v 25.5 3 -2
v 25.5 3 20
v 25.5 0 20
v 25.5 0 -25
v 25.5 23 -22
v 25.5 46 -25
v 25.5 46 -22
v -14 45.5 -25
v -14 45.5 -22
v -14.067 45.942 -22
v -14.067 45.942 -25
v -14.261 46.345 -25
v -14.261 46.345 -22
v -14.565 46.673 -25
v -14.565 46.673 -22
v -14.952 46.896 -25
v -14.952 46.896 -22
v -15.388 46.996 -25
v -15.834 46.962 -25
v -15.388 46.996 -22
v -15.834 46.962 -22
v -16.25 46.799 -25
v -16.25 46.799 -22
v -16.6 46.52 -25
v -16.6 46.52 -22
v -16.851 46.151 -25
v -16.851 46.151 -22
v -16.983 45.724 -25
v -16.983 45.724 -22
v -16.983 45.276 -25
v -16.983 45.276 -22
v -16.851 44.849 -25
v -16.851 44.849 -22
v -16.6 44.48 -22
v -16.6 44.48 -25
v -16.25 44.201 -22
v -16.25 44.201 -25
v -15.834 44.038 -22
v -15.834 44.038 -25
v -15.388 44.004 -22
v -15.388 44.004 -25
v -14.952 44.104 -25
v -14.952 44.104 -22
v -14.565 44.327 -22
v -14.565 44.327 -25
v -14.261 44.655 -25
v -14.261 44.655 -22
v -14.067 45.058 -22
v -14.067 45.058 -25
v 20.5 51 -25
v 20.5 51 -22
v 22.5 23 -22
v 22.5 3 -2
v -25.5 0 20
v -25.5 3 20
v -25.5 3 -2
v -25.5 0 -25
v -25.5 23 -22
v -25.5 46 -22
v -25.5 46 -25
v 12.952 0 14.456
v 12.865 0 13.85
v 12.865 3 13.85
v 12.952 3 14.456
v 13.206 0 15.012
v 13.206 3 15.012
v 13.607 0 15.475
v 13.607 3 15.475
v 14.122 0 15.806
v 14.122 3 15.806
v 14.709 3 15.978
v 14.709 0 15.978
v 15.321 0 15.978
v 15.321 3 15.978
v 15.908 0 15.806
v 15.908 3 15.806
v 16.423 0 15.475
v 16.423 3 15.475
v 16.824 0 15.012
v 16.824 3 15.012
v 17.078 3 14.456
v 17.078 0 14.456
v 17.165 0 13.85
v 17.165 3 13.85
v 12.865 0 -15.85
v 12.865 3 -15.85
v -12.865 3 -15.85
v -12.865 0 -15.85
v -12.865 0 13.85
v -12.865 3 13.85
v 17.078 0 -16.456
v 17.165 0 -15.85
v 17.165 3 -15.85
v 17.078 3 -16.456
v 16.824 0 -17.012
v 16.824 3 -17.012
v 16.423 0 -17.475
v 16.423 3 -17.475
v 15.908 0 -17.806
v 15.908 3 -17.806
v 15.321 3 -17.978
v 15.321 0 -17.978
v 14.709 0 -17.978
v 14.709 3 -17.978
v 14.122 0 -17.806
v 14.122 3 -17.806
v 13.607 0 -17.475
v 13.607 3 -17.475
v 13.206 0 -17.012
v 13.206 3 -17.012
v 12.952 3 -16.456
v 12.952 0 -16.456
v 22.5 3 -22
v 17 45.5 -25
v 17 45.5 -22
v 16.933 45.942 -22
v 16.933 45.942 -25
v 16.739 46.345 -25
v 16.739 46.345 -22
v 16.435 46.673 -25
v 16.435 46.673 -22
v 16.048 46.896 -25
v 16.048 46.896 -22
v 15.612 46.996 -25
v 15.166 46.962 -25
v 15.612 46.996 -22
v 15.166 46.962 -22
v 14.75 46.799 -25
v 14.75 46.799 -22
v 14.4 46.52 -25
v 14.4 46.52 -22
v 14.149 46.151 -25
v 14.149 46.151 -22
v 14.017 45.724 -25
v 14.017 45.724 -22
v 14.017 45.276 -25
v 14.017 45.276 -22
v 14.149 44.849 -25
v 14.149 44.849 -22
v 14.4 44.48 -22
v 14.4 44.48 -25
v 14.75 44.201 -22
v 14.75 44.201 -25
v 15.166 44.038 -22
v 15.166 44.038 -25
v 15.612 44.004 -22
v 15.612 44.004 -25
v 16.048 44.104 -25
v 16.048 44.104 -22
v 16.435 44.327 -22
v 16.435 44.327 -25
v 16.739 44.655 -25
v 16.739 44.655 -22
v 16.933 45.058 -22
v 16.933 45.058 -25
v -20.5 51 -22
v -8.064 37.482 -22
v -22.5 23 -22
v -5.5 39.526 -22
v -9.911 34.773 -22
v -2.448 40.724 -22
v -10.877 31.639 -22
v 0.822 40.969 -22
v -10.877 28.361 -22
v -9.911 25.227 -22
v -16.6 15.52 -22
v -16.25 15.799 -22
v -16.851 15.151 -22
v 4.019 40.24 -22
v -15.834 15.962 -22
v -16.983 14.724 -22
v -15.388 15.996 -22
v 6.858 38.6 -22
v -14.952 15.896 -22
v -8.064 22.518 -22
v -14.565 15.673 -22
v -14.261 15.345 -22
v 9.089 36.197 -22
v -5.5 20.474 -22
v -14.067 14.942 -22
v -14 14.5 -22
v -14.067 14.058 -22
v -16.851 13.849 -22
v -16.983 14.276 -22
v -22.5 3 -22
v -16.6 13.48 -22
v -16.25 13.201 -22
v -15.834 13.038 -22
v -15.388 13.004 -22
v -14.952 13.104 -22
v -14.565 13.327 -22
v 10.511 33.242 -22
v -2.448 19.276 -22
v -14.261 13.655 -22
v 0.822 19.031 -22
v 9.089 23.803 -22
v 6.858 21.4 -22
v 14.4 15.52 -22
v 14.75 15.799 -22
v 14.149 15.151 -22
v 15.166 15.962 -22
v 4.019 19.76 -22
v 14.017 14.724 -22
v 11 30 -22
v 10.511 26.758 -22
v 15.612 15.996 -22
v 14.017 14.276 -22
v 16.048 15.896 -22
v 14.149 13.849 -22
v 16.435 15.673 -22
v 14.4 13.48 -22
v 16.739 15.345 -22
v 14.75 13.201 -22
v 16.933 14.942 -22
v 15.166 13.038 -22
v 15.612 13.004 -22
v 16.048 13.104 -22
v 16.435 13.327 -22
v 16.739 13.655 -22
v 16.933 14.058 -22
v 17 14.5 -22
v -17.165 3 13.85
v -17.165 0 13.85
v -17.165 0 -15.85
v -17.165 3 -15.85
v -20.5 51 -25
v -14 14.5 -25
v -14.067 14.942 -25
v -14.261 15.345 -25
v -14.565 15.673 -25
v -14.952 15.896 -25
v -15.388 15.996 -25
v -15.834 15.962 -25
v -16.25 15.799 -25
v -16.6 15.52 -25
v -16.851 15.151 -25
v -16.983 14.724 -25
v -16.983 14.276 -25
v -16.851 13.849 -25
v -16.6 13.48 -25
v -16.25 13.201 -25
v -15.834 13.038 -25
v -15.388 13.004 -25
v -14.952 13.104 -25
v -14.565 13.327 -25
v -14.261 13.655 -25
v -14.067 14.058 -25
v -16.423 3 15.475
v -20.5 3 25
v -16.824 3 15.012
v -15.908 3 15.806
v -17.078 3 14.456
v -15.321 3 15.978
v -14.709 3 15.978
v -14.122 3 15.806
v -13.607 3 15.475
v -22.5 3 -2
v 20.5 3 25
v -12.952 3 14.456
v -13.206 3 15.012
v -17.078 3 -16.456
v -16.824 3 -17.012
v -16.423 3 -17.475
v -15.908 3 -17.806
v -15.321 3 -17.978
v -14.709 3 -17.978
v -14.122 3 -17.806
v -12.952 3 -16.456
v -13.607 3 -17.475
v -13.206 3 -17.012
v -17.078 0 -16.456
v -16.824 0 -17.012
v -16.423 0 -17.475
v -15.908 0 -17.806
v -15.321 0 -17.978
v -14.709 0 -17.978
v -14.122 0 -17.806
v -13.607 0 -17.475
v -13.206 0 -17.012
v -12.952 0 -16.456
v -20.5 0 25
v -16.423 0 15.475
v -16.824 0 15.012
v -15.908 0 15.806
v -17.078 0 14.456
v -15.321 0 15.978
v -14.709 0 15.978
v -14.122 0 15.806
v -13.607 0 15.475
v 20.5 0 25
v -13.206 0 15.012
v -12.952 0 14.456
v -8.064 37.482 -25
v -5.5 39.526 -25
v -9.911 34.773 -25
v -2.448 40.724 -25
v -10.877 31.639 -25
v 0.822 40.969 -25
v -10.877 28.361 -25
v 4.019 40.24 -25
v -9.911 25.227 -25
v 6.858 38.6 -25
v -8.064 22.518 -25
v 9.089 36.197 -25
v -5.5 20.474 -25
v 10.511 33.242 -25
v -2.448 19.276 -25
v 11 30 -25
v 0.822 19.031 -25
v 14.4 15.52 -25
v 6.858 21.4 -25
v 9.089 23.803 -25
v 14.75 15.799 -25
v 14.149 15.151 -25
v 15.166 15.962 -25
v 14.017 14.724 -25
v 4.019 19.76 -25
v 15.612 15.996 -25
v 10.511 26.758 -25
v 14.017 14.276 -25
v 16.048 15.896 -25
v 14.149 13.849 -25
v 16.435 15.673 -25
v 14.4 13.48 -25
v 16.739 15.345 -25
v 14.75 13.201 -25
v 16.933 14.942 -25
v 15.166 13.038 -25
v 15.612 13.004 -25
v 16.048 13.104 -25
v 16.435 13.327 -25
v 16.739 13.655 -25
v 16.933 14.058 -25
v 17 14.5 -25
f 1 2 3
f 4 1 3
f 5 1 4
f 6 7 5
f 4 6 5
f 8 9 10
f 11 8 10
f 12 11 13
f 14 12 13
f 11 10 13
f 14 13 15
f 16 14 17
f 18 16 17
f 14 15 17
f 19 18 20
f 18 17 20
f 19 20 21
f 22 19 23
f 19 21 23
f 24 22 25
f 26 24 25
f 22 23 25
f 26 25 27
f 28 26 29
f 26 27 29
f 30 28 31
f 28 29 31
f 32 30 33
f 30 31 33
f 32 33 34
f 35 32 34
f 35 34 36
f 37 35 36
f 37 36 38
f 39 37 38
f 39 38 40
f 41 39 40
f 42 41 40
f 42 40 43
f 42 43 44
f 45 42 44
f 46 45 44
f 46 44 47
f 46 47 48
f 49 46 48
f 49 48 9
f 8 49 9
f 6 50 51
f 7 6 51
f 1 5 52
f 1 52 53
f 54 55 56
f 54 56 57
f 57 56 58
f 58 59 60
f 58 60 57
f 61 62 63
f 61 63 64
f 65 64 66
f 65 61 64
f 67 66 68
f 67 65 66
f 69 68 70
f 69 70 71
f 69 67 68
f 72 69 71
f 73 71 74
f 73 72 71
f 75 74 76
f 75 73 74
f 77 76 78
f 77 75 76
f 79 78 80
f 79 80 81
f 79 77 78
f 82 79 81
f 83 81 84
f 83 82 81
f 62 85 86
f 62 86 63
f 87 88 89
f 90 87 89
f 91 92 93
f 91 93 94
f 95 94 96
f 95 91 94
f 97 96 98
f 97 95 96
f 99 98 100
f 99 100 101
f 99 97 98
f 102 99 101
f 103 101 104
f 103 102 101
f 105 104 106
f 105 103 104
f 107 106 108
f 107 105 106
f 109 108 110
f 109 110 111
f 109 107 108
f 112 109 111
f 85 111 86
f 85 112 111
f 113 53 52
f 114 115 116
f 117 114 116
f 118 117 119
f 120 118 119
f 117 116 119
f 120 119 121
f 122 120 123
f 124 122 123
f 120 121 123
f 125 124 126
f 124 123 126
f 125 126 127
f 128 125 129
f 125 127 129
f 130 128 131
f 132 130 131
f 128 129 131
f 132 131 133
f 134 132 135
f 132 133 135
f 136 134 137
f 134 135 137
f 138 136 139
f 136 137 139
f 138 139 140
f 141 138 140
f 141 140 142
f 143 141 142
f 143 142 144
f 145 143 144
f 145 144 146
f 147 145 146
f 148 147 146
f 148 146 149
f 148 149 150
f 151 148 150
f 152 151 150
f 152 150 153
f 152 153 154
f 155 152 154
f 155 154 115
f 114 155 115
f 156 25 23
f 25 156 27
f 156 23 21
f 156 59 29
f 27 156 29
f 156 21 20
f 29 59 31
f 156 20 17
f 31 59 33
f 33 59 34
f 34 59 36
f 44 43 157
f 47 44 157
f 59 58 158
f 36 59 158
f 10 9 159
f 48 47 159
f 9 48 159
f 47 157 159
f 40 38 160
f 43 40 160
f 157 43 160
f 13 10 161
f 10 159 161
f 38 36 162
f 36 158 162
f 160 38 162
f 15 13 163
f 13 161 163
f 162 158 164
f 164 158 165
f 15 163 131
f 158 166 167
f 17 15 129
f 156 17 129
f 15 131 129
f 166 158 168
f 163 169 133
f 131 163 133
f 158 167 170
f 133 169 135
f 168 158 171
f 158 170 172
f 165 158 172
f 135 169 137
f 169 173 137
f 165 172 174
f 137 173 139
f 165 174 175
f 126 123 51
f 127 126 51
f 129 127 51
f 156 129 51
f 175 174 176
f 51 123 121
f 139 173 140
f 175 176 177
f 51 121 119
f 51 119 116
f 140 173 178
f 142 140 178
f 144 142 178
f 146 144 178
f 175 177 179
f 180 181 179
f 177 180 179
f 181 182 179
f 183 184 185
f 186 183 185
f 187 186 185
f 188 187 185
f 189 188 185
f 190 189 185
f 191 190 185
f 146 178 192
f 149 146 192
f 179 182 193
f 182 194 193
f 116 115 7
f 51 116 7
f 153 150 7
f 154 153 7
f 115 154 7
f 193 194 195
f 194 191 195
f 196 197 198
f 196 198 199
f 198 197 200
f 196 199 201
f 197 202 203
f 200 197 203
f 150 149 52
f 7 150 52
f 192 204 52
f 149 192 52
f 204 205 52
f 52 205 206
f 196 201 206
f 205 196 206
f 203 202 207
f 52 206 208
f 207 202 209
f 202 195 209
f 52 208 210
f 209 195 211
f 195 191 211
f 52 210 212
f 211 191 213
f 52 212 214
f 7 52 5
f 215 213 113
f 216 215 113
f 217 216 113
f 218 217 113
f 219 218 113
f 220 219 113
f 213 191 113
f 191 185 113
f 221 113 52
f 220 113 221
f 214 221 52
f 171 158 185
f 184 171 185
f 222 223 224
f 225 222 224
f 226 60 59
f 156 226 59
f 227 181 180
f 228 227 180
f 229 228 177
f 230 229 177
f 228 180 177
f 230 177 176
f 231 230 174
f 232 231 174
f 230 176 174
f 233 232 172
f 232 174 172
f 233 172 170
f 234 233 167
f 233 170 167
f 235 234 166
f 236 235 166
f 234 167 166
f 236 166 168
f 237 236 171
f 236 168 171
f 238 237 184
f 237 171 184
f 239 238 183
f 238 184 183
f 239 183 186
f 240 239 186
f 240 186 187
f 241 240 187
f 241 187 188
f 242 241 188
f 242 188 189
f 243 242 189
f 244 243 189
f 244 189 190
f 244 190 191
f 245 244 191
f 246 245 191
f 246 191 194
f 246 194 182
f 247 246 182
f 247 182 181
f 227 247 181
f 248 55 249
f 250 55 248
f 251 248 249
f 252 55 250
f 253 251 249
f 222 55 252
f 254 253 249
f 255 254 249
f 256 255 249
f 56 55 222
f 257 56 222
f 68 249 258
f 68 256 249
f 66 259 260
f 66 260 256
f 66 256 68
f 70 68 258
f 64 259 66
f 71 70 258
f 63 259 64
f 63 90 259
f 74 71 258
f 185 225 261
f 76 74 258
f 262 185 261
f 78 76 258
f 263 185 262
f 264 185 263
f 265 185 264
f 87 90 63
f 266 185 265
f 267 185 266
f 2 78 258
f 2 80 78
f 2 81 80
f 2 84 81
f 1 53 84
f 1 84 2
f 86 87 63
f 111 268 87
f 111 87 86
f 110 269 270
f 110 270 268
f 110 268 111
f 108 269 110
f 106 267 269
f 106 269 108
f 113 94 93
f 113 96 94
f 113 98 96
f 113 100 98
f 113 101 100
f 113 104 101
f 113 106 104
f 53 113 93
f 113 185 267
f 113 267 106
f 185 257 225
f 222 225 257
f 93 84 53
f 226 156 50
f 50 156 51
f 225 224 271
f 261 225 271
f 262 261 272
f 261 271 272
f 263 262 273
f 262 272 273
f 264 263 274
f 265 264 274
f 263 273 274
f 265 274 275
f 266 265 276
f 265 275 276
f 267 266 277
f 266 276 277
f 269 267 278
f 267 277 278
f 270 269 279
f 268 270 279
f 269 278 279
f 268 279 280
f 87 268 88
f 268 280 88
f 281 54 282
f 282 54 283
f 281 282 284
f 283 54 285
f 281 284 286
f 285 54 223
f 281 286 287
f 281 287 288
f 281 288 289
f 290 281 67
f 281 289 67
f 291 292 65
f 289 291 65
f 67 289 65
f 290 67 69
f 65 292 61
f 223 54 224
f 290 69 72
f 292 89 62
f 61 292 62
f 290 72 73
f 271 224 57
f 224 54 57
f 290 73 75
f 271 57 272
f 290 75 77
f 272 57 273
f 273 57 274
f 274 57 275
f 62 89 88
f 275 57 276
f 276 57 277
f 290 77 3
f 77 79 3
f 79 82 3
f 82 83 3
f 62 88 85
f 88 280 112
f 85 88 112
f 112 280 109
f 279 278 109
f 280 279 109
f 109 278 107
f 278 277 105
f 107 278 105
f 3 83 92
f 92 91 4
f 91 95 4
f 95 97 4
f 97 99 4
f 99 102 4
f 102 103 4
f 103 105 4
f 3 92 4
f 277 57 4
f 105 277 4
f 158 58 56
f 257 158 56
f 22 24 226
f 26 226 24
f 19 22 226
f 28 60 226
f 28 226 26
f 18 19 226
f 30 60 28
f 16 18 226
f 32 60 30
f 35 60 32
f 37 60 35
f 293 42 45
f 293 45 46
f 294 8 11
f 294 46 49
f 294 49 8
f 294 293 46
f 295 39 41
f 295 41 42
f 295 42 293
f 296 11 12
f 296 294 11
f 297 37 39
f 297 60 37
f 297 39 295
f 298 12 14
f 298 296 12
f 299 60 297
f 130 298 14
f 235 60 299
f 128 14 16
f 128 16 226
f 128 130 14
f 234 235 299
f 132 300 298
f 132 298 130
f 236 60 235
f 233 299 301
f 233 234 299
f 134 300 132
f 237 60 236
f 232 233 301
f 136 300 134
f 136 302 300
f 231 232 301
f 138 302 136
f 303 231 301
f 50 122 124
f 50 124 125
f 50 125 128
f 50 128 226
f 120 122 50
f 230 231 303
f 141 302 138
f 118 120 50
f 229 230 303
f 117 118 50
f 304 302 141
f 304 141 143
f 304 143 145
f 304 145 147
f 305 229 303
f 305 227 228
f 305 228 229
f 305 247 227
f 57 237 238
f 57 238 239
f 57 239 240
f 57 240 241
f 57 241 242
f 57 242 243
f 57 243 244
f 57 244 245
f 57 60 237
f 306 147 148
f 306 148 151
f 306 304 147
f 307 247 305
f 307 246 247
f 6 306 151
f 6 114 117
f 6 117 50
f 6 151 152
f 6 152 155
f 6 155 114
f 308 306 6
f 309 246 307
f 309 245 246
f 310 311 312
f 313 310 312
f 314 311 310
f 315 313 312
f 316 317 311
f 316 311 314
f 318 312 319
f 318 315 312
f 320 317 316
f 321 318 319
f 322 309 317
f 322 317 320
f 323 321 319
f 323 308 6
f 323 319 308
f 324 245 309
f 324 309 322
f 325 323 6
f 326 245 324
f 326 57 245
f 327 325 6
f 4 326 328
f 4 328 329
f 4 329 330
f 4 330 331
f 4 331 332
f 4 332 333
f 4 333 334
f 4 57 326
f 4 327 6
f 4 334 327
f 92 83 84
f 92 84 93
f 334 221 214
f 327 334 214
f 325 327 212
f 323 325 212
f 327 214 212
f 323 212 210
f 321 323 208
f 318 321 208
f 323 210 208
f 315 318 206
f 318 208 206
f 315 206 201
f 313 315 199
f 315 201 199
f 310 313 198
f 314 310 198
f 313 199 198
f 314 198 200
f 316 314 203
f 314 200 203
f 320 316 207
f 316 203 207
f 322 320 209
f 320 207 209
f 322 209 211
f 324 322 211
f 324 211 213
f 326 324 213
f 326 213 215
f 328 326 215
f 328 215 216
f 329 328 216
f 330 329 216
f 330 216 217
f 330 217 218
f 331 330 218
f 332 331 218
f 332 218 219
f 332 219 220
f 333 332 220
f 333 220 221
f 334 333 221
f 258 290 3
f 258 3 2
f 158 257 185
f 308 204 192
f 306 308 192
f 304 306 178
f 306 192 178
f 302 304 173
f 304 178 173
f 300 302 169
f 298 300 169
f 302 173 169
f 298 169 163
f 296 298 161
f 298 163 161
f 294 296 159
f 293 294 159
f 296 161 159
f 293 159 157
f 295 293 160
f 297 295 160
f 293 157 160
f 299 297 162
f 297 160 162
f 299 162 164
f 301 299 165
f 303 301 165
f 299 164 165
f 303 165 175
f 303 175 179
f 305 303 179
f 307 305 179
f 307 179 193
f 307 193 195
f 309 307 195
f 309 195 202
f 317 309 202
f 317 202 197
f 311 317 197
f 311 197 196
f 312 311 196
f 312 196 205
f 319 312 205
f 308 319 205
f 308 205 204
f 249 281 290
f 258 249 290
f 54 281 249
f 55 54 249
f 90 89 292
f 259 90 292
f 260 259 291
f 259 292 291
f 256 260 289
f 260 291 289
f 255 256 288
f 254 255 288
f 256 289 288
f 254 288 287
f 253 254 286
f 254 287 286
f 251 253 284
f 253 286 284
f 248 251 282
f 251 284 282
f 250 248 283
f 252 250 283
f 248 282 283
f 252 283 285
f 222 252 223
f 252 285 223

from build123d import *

# Parameters (mm, degrees)
SKETCH1_W           = 51
SKETCH1_H           = 50
BOSS_EXTRUDE1_DEPTH = 3
SKETCH2_W           = 51
SKETCH2_H           = 3
BOSS_EXTRUDE2_DEPTH = 51
SKETCH3_R           = 11
SKETCH3_R_2         = 1.5
CUT_EXTRUDE1_DEPTH  = 4
BOSS_EXTRUDE3_DEPTH = 3
CHAMFER1_SIZE       = 5


with BuildPart() as part:
    # Sketch1 → Boss-Extrude1 (new body)
    with BuildSketch(Plane(origin=(0, 0, 0), x_dir=(1, 0, 0), z_dir=(0, 1, 0))):
        Rectangle(SKETCH1_W, SKETCH1_H)
        with BuildLine():
            Line((-12.865, 15.85), (-12.865, -13.85))
            ThreePointArc((-12.865, -13.85), (-15.015, -16), (-17.165, -13.85))
            Line((-17.165, -13.85), (-17.165, 15.85))
            ThreePointArc((-17.165, 15.85), (-15.015, 18), (-12.865, 15.85))
        make_face(mode=Mode.SUBTRACT)
        with BuildLine():
            Line((12.865, 15.85), (12.865, -13.85))
            ThreePointArc((12.865, -13.85), (15.015, -16), (17.165, -13.85))
            Line((17.165, -13.85), (17.165, 15.85))
            ThreePointArc((17.165, 15.85), (15.015, 18), (12.865, 15.85))
        make_face(mode=Mode.SUBTRACT)
    extrude(amount=BOSS_EXTRUDE1_DEPTH)

    # Sketch2 → Boss-Extrude2 (add)
    with BuildSketch(Plane.XZ):
        with Locations((0, -23.5)):
            Rectangle(SKETCH2_W, SKETCH2_H)
    extrude(amount=-BOSS_EXTRUDE2_DEPTH)

    # Sketch3 → Cut-Extrude1 (cut, through all)
    with BuildSketch(Plane.XY.offset(-22)):
        with Locations((0, 30)):
            Circle(SKETCH3_R)
        with Locations((-15.5, 45.5)):
            Circle(SKETCH3_R_2)
        with Locations((15.5, 45.5)):
            Circle(SKETCH3_R_2)
        with Locations((-15.5, 14.5)):
            Circle(SKETCH3_R_2)
        with Locations((15.5, 14.5)):
            Circle(SKETCH3_R_2)
    extrude(amount=-CUT_EXTRUDE1_DEPTH, mode=Mode.SUBTRACT)

    # Sketch5 → Boss-Extrude3 (add)
    with BuildSketch(Plane.ZY.offset(25.5)):
        Polygon((-22, 23), (-2, 3), (-22, 3), align=None)
    boss_extrude3 = extrude(amount=-BOSS_EXTRUDE3_DEPTH)

    # Mirror1: Boss-Extrude3 across plane
    add(boss_extrude3.mirror(Plane(origin=(0, 0, 0), x_dir=(0, 0, 1), z_dir=(1, 0, 0))))

    # Chamfer1
    chamfer1_edges = [part.edges().sort_by_distance(p)[0] for p in [
        (-25.5, 51, -23.5),
        (25.5, 51, -23.5),
        (25.5, 1.5, 25),
        (-25.5, 1.5, 25),
    ]]
    chamfer(chamfer1_edges, length=CHAMFER1_SIZE)


solid = part.part
